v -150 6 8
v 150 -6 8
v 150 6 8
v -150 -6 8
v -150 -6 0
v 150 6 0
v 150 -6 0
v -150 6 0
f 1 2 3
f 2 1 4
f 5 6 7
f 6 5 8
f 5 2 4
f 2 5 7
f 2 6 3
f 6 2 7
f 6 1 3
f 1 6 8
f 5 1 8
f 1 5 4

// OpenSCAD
// === RECTANGULAR PIN PARAMETERS ===
pin_length = 300;
pin_width = 12;
pin_height = 8;

// Center it on X/Y and sit on Z=0
translate([-pin_length/2, -pin_width/2, 0])
    cube([pin_length, pin_width, pin_height], center = false);
